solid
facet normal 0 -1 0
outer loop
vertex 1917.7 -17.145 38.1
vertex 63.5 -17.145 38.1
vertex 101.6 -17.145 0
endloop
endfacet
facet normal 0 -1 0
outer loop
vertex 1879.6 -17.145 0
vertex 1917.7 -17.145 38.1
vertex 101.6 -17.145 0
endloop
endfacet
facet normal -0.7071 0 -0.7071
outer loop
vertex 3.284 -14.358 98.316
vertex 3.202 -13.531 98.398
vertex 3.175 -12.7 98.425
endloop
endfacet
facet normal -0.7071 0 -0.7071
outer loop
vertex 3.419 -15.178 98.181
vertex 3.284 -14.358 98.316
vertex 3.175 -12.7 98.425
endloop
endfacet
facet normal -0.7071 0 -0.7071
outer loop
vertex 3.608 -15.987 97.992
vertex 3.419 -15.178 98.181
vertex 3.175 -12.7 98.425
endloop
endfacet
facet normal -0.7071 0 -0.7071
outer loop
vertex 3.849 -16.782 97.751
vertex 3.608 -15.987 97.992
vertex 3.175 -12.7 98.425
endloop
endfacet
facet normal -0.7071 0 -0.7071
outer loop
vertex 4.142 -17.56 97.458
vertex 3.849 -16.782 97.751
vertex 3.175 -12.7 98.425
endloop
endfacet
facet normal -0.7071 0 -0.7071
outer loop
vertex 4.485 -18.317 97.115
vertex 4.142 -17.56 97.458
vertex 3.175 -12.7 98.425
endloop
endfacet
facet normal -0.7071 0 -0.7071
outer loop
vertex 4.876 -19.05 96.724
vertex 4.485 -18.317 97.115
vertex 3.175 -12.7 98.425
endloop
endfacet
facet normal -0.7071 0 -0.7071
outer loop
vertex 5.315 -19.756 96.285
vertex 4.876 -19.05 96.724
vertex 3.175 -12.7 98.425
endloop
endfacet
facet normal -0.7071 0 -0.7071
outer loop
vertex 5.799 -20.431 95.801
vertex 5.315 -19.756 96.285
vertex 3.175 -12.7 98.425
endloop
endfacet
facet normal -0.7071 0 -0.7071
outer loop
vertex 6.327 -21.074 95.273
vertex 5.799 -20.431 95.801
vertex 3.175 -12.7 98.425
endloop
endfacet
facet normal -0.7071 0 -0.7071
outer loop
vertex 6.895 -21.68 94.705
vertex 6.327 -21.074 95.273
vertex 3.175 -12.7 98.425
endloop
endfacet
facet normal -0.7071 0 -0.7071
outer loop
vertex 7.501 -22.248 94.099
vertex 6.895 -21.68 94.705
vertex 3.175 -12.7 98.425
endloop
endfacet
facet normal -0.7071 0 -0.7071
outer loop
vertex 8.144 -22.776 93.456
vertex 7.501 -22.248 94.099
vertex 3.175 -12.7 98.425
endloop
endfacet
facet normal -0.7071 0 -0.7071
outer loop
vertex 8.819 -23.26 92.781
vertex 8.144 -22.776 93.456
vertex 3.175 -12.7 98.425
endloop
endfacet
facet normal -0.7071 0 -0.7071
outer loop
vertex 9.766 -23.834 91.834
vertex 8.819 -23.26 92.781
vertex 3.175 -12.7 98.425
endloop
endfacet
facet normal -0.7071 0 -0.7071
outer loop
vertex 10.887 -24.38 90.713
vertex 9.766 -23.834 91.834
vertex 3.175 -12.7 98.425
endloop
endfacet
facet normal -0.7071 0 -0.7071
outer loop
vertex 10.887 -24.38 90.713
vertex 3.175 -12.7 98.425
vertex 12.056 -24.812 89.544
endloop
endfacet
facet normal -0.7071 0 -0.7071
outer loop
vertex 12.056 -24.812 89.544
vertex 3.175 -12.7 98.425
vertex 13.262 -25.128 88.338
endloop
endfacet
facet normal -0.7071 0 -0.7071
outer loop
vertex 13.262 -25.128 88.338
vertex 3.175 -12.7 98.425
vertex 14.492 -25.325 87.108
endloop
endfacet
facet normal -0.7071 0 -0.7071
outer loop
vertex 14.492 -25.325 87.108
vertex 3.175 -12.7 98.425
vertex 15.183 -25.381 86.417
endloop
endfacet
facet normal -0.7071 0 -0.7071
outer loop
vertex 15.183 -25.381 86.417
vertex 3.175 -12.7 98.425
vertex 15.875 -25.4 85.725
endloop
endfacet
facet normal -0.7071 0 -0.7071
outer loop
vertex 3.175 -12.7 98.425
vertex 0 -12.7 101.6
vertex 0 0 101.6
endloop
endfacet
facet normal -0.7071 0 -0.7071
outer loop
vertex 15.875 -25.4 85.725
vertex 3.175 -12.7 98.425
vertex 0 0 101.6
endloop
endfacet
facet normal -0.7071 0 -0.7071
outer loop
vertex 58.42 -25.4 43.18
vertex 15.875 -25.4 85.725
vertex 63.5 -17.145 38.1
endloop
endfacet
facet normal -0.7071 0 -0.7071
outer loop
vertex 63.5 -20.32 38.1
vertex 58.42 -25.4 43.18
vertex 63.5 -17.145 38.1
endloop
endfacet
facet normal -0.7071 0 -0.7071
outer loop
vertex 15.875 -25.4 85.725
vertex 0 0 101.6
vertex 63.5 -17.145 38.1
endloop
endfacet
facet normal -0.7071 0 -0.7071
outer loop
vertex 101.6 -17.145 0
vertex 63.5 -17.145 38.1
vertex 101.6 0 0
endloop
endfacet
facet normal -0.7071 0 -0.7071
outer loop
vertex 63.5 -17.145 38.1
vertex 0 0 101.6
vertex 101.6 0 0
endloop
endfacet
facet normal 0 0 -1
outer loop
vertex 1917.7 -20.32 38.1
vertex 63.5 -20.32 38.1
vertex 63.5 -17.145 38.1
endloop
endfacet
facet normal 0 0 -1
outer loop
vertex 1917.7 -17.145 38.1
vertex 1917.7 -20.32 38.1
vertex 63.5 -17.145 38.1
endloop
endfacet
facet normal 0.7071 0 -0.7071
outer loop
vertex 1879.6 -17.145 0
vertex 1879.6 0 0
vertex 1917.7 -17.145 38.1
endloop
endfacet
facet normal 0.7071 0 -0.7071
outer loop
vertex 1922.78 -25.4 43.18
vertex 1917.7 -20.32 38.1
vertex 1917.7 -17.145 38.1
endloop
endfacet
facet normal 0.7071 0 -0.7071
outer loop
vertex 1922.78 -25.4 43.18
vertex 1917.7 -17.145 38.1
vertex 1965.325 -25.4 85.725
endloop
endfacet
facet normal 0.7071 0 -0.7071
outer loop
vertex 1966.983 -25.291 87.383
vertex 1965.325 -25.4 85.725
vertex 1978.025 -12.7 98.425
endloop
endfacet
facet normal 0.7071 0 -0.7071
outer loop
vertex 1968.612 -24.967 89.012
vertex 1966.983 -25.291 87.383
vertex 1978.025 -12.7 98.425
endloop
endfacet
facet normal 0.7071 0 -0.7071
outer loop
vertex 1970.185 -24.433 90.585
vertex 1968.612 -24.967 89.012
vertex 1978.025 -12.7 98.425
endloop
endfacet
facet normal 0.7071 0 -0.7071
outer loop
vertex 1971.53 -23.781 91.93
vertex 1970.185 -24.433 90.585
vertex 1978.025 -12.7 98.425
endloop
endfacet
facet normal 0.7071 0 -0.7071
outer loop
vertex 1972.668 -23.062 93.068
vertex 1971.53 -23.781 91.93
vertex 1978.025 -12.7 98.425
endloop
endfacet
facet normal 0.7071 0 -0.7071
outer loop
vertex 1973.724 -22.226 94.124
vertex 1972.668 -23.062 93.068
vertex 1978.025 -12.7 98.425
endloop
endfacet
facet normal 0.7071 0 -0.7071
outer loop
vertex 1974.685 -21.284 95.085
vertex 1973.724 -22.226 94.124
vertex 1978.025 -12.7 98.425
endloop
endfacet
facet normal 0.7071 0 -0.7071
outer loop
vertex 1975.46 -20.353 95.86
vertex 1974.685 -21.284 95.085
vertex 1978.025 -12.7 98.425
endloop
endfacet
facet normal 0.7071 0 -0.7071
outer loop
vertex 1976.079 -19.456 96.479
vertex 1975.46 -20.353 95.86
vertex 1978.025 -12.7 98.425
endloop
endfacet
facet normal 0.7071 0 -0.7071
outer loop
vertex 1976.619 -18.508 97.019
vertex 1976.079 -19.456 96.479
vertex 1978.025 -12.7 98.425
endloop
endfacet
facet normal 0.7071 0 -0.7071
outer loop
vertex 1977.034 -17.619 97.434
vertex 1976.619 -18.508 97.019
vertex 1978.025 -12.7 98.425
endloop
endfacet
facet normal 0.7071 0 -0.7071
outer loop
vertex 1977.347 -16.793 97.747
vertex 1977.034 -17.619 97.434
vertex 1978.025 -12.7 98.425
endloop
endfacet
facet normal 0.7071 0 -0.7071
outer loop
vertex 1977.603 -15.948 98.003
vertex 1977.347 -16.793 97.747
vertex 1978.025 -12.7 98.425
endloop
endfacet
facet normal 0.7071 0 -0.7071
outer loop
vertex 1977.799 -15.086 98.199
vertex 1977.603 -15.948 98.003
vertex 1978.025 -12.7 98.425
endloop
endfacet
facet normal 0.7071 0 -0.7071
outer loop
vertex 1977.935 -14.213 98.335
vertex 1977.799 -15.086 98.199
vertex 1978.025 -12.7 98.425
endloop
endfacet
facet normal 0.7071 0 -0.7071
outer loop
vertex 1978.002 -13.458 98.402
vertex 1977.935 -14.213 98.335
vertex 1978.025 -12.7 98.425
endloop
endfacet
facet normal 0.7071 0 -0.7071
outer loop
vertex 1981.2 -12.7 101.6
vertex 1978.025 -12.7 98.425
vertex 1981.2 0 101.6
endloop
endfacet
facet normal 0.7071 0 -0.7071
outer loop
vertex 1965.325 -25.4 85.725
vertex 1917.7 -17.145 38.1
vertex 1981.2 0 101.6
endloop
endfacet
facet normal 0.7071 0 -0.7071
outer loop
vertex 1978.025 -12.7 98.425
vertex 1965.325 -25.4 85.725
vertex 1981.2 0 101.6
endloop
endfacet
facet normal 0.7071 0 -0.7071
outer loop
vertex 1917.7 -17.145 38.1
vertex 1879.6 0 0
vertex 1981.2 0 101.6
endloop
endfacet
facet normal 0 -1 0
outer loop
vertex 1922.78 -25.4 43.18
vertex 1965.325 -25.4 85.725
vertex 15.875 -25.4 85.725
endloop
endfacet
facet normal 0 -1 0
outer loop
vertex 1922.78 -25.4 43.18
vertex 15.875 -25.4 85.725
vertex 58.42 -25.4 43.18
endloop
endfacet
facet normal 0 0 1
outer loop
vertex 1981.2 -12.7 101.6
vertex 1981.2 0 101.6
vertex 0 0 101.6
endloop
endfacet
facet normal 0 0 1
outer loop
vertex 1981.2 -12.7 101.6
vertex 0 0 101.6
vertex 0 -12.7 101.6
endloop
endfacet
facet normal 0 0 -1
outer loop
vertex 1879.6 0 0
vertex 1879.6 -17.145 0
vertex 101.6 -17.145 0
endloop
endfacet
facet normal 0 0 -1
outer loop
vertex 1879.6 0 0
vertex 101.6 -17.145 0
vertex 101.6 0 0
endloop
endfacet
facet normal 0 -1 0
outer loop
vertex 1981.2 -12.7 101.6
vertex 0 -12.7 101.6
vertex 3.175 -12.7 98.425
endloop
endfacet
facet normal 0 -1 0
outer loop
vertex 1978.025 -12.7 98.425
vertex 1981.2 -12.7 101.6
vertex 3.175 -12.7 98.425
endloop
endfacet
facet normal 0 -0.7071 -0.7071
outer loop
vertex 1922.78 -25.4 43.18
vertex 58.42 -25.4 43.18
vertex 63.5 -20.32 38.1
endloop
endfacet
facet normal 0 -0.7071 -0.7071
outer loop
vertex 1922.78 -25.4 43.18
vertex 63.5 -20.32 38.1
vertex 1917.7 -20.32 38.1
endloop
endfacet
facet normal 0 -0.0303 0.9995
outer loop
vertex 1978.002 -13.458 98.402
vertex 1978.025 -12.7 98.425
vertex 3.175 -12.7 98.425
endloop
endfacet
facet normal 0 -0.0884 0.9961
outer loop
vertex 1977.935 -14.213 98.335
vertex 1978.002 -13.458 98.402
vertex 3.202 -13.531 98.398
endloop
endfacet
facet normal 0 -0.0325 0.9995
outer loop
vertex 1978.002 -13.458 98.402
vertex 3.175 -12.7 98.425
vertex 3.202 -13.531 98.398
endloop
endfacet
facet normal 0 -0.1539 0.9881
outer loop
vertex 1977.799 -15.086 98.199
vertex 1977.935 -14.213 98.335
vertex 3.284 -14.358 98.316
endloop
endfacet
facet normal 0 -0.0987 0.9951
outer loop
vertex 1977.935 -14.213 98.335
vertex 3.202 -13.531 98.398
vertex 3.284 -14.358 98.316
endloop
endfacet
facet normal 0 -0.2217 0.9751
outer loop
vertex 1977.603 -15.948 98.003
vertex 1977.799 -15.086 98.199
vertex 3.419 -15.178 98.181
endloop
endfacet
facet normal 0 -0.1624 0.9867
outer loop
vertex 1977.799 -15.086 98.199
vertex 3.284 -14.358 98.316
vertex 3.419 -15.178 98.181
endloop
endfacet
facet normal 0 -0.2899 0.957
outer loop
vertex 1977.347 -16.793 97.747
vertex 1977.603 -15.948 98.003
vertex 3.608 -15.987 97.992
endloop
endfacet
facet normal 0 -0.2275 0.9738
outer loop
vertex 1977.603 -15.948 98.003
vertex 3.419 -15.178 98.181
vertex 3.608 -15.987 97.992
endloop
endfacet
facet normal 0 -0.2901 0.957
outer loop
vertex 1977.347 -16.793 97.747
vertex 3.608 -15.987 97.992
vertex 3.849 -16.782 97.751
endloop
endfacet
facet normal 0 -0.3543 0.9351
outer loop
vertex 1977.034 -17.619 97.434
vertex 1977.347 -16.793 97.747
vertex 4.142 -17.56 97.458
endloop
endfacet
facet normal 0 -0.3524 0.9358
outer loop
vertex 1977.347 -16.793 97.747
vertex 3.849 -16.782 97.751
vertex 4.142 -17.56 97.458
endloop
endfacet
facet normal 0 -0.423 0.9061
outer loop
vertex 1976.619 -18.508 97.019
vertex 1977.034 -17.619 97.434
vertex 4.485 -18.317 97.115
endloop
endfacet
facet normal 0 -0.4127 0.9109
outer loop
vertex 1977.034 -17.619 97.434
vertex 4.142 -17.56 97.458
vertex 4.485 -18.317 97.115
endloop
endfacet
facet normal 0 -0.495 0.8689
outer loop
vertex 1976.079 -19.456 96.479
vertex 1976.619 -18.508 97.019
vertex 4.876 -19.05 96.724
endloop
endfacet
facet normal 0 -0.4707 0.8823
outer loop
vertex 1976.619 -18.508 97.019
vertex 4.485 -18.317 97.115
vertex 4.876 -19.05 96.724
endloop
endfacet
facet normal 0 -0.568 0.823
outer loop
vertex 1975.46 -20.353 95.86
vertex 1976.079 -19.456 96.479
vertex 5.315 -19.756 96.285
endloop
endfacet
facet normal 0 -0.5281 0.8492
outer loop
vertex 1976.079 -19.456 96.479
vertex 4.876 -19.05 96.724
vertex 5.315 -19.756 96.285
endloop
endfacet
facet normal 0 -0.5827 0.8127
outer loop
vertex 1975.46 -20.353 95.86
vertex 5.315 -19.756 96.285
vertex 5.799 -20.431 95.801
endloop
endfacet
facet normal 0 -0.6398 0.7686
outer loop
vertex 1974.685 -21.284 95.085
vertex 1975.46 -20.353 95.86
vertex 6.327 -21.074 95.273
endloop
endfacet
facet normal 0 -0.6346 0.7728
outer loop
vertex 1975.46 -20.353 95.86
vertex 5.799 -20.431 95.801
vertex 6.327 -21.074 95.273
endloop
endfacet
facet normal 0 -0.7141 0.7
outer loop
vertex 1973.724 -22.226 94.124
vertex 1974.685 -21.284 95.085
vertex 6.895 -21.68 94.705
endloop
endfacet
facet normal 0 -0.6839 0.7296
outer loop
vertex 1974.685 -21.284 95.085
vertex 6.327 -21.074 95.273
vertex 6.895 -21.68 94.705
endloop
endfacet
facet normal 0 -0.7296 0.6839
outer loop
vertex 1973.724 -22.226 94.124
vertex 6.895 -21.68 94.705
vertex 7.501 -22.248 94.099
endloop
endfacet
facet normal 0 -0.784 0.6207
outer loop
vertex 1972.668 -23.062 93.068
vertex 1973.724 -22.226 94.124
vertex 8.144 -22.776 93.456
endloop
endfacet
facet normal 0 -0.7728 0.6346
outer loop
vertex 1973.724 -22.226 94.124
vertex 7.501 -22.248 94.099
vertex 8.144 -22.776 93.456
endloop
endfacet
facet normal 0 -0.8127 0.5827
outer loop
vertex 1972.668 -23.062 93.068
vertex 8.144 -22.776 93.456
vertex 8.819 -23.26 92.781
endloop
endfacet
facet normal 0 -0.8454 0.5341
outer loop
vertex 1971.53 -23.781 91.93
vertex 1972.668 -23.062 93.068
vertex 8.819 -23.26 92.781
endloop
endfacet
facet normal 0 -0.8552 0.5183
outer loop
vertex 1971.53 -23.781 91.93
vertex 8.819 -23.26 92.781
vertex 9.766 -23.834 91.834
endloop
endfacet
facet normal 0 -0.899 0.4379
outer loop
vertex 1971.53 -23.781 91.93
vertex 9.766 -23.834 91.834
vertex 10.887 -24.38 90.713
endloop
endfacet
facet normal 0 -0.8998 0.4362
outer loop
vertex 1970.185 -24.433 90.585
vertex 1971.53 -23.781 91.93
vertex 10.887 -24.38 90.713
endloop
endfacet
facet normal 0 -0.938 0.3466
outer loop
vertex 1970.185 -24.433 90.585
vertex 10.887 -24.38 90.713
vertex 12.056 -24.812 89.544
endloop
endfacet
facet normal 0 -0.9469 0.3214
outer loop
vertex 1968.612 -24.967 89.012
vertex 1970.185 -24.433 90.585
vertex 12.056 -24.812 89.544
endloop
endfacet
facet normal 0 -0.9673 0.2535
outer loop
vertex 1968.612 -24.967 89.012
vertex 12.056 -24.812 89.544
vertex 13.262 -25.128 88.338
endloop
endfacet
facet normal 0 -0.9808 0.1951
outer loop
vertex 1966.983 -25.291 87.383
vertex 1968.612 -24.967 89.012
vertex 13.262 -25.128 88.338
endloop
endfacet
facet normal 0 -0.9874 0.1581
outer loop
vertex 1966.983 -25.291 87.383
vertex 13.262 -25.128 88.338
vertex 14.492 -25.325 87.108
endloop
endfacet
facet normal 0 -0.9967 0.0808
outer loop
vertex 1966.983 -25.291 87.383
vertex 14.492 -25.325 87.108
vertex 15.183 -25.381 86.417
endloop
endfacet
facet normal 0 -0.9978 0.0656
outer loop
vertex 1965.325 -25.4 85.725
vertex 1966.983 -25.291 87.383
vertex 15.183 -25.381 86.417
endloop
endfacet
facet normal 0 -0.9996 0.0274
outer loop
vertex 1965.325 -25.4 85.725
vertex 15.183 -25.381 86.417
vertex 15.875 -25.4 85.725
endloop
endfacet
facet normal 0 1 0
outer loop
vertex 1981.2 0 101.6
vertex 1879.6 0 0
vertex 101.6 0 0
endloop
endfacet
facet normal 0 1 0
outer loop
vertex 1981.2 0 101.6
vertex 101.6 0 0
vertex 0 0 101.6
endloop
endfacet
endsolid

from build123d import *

# Parameters (mm, degrees)
F1_DEPTH = 1981.2
F3_DEPTH = 25.4
F4_SIZE  = 5.08


with BuildPart() as f1:
    # F0 (on Right) → F1 (new body)
    with BuildSketch(Plane.YZ):
        with BuildLine():
            Line((-17.145, 0), (0, 0))
            Line((0, 0), (0, 101.6))
            Line((0, 101.6), (-12.7, 101.6))
            Line((-12.7, 101.6), (-12.7, 98.425))
            ThreePointArc((-12.7, 98.425), (-21.680256, 94.705256), (-25.4, 85.725))
            Line((-25.4, 85.725), (-25.4, 38.1))
            Line((-25.4, 38.1), (-17.145, 38.1))
            Line((-17.145, 38.1), (-17.145, 0))
        make_face()
    extrude(amount=F1_DEPTH)

    # F2 (on face) → F3 (cut)
    with BuildSketch(Plane(origin=(0, 0, 0), x_dir=(-1, 0, 0), z_dir=(0, 1, 0))):
        Polygon((-1879.6, 0), (-1981.2, 101.6), (-1981.2, 0), align=None)
        Polygon((0, 0), (0, 101.6), (-101.6, 0), align=None)
    extrude(amount=-F3_DEPTH, mode=Mode.SUBTRACT)

    # F4
    f4_edges = [f1.edges().sort_by_distance(p)[0] for p in [
        (990.6, -25.4, 38.1),
    ]]
    chamfer(f4_edges, length=F4_SIZE)


solid = f1.part
